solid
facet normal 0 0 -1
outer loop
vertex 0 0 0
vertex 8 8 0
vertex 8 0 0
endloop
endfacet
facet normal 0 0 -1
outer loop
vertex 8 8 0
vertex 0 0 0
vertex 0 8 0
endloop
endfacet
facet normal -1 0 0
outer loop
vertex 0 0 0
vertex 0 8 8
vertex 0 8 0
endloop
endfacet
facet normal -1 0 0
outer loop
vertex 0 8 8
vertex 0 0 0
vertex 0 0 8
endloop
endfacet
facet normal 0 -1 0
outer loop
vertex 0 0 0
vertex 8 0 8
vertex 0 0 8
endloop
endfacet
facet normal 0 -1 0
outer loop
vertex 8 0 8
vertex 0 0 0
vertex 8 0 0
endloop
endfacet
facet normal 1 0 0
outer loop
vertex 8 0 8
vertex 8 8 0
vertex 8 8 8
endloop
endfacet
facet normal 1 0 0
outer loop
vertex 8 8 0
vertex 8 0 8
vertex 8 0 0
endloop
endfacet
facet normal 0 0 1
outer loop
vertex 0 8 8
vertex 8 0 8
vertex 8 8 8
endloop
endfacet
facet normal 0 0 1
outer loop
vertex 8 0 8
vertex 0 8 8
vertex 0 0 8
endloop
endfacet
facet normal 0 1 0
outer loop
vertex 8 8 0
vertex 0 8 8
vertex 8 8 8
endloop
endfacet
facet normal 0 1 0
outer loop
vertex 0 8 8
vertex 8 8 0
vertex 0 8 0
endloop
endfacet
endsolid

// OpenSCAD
for (i = [0:3]) cube([i,i,i]);
cube([4,4,4]);
for (i = [5:7]) cube([i,i,i]);
cube([8,8,8]);
